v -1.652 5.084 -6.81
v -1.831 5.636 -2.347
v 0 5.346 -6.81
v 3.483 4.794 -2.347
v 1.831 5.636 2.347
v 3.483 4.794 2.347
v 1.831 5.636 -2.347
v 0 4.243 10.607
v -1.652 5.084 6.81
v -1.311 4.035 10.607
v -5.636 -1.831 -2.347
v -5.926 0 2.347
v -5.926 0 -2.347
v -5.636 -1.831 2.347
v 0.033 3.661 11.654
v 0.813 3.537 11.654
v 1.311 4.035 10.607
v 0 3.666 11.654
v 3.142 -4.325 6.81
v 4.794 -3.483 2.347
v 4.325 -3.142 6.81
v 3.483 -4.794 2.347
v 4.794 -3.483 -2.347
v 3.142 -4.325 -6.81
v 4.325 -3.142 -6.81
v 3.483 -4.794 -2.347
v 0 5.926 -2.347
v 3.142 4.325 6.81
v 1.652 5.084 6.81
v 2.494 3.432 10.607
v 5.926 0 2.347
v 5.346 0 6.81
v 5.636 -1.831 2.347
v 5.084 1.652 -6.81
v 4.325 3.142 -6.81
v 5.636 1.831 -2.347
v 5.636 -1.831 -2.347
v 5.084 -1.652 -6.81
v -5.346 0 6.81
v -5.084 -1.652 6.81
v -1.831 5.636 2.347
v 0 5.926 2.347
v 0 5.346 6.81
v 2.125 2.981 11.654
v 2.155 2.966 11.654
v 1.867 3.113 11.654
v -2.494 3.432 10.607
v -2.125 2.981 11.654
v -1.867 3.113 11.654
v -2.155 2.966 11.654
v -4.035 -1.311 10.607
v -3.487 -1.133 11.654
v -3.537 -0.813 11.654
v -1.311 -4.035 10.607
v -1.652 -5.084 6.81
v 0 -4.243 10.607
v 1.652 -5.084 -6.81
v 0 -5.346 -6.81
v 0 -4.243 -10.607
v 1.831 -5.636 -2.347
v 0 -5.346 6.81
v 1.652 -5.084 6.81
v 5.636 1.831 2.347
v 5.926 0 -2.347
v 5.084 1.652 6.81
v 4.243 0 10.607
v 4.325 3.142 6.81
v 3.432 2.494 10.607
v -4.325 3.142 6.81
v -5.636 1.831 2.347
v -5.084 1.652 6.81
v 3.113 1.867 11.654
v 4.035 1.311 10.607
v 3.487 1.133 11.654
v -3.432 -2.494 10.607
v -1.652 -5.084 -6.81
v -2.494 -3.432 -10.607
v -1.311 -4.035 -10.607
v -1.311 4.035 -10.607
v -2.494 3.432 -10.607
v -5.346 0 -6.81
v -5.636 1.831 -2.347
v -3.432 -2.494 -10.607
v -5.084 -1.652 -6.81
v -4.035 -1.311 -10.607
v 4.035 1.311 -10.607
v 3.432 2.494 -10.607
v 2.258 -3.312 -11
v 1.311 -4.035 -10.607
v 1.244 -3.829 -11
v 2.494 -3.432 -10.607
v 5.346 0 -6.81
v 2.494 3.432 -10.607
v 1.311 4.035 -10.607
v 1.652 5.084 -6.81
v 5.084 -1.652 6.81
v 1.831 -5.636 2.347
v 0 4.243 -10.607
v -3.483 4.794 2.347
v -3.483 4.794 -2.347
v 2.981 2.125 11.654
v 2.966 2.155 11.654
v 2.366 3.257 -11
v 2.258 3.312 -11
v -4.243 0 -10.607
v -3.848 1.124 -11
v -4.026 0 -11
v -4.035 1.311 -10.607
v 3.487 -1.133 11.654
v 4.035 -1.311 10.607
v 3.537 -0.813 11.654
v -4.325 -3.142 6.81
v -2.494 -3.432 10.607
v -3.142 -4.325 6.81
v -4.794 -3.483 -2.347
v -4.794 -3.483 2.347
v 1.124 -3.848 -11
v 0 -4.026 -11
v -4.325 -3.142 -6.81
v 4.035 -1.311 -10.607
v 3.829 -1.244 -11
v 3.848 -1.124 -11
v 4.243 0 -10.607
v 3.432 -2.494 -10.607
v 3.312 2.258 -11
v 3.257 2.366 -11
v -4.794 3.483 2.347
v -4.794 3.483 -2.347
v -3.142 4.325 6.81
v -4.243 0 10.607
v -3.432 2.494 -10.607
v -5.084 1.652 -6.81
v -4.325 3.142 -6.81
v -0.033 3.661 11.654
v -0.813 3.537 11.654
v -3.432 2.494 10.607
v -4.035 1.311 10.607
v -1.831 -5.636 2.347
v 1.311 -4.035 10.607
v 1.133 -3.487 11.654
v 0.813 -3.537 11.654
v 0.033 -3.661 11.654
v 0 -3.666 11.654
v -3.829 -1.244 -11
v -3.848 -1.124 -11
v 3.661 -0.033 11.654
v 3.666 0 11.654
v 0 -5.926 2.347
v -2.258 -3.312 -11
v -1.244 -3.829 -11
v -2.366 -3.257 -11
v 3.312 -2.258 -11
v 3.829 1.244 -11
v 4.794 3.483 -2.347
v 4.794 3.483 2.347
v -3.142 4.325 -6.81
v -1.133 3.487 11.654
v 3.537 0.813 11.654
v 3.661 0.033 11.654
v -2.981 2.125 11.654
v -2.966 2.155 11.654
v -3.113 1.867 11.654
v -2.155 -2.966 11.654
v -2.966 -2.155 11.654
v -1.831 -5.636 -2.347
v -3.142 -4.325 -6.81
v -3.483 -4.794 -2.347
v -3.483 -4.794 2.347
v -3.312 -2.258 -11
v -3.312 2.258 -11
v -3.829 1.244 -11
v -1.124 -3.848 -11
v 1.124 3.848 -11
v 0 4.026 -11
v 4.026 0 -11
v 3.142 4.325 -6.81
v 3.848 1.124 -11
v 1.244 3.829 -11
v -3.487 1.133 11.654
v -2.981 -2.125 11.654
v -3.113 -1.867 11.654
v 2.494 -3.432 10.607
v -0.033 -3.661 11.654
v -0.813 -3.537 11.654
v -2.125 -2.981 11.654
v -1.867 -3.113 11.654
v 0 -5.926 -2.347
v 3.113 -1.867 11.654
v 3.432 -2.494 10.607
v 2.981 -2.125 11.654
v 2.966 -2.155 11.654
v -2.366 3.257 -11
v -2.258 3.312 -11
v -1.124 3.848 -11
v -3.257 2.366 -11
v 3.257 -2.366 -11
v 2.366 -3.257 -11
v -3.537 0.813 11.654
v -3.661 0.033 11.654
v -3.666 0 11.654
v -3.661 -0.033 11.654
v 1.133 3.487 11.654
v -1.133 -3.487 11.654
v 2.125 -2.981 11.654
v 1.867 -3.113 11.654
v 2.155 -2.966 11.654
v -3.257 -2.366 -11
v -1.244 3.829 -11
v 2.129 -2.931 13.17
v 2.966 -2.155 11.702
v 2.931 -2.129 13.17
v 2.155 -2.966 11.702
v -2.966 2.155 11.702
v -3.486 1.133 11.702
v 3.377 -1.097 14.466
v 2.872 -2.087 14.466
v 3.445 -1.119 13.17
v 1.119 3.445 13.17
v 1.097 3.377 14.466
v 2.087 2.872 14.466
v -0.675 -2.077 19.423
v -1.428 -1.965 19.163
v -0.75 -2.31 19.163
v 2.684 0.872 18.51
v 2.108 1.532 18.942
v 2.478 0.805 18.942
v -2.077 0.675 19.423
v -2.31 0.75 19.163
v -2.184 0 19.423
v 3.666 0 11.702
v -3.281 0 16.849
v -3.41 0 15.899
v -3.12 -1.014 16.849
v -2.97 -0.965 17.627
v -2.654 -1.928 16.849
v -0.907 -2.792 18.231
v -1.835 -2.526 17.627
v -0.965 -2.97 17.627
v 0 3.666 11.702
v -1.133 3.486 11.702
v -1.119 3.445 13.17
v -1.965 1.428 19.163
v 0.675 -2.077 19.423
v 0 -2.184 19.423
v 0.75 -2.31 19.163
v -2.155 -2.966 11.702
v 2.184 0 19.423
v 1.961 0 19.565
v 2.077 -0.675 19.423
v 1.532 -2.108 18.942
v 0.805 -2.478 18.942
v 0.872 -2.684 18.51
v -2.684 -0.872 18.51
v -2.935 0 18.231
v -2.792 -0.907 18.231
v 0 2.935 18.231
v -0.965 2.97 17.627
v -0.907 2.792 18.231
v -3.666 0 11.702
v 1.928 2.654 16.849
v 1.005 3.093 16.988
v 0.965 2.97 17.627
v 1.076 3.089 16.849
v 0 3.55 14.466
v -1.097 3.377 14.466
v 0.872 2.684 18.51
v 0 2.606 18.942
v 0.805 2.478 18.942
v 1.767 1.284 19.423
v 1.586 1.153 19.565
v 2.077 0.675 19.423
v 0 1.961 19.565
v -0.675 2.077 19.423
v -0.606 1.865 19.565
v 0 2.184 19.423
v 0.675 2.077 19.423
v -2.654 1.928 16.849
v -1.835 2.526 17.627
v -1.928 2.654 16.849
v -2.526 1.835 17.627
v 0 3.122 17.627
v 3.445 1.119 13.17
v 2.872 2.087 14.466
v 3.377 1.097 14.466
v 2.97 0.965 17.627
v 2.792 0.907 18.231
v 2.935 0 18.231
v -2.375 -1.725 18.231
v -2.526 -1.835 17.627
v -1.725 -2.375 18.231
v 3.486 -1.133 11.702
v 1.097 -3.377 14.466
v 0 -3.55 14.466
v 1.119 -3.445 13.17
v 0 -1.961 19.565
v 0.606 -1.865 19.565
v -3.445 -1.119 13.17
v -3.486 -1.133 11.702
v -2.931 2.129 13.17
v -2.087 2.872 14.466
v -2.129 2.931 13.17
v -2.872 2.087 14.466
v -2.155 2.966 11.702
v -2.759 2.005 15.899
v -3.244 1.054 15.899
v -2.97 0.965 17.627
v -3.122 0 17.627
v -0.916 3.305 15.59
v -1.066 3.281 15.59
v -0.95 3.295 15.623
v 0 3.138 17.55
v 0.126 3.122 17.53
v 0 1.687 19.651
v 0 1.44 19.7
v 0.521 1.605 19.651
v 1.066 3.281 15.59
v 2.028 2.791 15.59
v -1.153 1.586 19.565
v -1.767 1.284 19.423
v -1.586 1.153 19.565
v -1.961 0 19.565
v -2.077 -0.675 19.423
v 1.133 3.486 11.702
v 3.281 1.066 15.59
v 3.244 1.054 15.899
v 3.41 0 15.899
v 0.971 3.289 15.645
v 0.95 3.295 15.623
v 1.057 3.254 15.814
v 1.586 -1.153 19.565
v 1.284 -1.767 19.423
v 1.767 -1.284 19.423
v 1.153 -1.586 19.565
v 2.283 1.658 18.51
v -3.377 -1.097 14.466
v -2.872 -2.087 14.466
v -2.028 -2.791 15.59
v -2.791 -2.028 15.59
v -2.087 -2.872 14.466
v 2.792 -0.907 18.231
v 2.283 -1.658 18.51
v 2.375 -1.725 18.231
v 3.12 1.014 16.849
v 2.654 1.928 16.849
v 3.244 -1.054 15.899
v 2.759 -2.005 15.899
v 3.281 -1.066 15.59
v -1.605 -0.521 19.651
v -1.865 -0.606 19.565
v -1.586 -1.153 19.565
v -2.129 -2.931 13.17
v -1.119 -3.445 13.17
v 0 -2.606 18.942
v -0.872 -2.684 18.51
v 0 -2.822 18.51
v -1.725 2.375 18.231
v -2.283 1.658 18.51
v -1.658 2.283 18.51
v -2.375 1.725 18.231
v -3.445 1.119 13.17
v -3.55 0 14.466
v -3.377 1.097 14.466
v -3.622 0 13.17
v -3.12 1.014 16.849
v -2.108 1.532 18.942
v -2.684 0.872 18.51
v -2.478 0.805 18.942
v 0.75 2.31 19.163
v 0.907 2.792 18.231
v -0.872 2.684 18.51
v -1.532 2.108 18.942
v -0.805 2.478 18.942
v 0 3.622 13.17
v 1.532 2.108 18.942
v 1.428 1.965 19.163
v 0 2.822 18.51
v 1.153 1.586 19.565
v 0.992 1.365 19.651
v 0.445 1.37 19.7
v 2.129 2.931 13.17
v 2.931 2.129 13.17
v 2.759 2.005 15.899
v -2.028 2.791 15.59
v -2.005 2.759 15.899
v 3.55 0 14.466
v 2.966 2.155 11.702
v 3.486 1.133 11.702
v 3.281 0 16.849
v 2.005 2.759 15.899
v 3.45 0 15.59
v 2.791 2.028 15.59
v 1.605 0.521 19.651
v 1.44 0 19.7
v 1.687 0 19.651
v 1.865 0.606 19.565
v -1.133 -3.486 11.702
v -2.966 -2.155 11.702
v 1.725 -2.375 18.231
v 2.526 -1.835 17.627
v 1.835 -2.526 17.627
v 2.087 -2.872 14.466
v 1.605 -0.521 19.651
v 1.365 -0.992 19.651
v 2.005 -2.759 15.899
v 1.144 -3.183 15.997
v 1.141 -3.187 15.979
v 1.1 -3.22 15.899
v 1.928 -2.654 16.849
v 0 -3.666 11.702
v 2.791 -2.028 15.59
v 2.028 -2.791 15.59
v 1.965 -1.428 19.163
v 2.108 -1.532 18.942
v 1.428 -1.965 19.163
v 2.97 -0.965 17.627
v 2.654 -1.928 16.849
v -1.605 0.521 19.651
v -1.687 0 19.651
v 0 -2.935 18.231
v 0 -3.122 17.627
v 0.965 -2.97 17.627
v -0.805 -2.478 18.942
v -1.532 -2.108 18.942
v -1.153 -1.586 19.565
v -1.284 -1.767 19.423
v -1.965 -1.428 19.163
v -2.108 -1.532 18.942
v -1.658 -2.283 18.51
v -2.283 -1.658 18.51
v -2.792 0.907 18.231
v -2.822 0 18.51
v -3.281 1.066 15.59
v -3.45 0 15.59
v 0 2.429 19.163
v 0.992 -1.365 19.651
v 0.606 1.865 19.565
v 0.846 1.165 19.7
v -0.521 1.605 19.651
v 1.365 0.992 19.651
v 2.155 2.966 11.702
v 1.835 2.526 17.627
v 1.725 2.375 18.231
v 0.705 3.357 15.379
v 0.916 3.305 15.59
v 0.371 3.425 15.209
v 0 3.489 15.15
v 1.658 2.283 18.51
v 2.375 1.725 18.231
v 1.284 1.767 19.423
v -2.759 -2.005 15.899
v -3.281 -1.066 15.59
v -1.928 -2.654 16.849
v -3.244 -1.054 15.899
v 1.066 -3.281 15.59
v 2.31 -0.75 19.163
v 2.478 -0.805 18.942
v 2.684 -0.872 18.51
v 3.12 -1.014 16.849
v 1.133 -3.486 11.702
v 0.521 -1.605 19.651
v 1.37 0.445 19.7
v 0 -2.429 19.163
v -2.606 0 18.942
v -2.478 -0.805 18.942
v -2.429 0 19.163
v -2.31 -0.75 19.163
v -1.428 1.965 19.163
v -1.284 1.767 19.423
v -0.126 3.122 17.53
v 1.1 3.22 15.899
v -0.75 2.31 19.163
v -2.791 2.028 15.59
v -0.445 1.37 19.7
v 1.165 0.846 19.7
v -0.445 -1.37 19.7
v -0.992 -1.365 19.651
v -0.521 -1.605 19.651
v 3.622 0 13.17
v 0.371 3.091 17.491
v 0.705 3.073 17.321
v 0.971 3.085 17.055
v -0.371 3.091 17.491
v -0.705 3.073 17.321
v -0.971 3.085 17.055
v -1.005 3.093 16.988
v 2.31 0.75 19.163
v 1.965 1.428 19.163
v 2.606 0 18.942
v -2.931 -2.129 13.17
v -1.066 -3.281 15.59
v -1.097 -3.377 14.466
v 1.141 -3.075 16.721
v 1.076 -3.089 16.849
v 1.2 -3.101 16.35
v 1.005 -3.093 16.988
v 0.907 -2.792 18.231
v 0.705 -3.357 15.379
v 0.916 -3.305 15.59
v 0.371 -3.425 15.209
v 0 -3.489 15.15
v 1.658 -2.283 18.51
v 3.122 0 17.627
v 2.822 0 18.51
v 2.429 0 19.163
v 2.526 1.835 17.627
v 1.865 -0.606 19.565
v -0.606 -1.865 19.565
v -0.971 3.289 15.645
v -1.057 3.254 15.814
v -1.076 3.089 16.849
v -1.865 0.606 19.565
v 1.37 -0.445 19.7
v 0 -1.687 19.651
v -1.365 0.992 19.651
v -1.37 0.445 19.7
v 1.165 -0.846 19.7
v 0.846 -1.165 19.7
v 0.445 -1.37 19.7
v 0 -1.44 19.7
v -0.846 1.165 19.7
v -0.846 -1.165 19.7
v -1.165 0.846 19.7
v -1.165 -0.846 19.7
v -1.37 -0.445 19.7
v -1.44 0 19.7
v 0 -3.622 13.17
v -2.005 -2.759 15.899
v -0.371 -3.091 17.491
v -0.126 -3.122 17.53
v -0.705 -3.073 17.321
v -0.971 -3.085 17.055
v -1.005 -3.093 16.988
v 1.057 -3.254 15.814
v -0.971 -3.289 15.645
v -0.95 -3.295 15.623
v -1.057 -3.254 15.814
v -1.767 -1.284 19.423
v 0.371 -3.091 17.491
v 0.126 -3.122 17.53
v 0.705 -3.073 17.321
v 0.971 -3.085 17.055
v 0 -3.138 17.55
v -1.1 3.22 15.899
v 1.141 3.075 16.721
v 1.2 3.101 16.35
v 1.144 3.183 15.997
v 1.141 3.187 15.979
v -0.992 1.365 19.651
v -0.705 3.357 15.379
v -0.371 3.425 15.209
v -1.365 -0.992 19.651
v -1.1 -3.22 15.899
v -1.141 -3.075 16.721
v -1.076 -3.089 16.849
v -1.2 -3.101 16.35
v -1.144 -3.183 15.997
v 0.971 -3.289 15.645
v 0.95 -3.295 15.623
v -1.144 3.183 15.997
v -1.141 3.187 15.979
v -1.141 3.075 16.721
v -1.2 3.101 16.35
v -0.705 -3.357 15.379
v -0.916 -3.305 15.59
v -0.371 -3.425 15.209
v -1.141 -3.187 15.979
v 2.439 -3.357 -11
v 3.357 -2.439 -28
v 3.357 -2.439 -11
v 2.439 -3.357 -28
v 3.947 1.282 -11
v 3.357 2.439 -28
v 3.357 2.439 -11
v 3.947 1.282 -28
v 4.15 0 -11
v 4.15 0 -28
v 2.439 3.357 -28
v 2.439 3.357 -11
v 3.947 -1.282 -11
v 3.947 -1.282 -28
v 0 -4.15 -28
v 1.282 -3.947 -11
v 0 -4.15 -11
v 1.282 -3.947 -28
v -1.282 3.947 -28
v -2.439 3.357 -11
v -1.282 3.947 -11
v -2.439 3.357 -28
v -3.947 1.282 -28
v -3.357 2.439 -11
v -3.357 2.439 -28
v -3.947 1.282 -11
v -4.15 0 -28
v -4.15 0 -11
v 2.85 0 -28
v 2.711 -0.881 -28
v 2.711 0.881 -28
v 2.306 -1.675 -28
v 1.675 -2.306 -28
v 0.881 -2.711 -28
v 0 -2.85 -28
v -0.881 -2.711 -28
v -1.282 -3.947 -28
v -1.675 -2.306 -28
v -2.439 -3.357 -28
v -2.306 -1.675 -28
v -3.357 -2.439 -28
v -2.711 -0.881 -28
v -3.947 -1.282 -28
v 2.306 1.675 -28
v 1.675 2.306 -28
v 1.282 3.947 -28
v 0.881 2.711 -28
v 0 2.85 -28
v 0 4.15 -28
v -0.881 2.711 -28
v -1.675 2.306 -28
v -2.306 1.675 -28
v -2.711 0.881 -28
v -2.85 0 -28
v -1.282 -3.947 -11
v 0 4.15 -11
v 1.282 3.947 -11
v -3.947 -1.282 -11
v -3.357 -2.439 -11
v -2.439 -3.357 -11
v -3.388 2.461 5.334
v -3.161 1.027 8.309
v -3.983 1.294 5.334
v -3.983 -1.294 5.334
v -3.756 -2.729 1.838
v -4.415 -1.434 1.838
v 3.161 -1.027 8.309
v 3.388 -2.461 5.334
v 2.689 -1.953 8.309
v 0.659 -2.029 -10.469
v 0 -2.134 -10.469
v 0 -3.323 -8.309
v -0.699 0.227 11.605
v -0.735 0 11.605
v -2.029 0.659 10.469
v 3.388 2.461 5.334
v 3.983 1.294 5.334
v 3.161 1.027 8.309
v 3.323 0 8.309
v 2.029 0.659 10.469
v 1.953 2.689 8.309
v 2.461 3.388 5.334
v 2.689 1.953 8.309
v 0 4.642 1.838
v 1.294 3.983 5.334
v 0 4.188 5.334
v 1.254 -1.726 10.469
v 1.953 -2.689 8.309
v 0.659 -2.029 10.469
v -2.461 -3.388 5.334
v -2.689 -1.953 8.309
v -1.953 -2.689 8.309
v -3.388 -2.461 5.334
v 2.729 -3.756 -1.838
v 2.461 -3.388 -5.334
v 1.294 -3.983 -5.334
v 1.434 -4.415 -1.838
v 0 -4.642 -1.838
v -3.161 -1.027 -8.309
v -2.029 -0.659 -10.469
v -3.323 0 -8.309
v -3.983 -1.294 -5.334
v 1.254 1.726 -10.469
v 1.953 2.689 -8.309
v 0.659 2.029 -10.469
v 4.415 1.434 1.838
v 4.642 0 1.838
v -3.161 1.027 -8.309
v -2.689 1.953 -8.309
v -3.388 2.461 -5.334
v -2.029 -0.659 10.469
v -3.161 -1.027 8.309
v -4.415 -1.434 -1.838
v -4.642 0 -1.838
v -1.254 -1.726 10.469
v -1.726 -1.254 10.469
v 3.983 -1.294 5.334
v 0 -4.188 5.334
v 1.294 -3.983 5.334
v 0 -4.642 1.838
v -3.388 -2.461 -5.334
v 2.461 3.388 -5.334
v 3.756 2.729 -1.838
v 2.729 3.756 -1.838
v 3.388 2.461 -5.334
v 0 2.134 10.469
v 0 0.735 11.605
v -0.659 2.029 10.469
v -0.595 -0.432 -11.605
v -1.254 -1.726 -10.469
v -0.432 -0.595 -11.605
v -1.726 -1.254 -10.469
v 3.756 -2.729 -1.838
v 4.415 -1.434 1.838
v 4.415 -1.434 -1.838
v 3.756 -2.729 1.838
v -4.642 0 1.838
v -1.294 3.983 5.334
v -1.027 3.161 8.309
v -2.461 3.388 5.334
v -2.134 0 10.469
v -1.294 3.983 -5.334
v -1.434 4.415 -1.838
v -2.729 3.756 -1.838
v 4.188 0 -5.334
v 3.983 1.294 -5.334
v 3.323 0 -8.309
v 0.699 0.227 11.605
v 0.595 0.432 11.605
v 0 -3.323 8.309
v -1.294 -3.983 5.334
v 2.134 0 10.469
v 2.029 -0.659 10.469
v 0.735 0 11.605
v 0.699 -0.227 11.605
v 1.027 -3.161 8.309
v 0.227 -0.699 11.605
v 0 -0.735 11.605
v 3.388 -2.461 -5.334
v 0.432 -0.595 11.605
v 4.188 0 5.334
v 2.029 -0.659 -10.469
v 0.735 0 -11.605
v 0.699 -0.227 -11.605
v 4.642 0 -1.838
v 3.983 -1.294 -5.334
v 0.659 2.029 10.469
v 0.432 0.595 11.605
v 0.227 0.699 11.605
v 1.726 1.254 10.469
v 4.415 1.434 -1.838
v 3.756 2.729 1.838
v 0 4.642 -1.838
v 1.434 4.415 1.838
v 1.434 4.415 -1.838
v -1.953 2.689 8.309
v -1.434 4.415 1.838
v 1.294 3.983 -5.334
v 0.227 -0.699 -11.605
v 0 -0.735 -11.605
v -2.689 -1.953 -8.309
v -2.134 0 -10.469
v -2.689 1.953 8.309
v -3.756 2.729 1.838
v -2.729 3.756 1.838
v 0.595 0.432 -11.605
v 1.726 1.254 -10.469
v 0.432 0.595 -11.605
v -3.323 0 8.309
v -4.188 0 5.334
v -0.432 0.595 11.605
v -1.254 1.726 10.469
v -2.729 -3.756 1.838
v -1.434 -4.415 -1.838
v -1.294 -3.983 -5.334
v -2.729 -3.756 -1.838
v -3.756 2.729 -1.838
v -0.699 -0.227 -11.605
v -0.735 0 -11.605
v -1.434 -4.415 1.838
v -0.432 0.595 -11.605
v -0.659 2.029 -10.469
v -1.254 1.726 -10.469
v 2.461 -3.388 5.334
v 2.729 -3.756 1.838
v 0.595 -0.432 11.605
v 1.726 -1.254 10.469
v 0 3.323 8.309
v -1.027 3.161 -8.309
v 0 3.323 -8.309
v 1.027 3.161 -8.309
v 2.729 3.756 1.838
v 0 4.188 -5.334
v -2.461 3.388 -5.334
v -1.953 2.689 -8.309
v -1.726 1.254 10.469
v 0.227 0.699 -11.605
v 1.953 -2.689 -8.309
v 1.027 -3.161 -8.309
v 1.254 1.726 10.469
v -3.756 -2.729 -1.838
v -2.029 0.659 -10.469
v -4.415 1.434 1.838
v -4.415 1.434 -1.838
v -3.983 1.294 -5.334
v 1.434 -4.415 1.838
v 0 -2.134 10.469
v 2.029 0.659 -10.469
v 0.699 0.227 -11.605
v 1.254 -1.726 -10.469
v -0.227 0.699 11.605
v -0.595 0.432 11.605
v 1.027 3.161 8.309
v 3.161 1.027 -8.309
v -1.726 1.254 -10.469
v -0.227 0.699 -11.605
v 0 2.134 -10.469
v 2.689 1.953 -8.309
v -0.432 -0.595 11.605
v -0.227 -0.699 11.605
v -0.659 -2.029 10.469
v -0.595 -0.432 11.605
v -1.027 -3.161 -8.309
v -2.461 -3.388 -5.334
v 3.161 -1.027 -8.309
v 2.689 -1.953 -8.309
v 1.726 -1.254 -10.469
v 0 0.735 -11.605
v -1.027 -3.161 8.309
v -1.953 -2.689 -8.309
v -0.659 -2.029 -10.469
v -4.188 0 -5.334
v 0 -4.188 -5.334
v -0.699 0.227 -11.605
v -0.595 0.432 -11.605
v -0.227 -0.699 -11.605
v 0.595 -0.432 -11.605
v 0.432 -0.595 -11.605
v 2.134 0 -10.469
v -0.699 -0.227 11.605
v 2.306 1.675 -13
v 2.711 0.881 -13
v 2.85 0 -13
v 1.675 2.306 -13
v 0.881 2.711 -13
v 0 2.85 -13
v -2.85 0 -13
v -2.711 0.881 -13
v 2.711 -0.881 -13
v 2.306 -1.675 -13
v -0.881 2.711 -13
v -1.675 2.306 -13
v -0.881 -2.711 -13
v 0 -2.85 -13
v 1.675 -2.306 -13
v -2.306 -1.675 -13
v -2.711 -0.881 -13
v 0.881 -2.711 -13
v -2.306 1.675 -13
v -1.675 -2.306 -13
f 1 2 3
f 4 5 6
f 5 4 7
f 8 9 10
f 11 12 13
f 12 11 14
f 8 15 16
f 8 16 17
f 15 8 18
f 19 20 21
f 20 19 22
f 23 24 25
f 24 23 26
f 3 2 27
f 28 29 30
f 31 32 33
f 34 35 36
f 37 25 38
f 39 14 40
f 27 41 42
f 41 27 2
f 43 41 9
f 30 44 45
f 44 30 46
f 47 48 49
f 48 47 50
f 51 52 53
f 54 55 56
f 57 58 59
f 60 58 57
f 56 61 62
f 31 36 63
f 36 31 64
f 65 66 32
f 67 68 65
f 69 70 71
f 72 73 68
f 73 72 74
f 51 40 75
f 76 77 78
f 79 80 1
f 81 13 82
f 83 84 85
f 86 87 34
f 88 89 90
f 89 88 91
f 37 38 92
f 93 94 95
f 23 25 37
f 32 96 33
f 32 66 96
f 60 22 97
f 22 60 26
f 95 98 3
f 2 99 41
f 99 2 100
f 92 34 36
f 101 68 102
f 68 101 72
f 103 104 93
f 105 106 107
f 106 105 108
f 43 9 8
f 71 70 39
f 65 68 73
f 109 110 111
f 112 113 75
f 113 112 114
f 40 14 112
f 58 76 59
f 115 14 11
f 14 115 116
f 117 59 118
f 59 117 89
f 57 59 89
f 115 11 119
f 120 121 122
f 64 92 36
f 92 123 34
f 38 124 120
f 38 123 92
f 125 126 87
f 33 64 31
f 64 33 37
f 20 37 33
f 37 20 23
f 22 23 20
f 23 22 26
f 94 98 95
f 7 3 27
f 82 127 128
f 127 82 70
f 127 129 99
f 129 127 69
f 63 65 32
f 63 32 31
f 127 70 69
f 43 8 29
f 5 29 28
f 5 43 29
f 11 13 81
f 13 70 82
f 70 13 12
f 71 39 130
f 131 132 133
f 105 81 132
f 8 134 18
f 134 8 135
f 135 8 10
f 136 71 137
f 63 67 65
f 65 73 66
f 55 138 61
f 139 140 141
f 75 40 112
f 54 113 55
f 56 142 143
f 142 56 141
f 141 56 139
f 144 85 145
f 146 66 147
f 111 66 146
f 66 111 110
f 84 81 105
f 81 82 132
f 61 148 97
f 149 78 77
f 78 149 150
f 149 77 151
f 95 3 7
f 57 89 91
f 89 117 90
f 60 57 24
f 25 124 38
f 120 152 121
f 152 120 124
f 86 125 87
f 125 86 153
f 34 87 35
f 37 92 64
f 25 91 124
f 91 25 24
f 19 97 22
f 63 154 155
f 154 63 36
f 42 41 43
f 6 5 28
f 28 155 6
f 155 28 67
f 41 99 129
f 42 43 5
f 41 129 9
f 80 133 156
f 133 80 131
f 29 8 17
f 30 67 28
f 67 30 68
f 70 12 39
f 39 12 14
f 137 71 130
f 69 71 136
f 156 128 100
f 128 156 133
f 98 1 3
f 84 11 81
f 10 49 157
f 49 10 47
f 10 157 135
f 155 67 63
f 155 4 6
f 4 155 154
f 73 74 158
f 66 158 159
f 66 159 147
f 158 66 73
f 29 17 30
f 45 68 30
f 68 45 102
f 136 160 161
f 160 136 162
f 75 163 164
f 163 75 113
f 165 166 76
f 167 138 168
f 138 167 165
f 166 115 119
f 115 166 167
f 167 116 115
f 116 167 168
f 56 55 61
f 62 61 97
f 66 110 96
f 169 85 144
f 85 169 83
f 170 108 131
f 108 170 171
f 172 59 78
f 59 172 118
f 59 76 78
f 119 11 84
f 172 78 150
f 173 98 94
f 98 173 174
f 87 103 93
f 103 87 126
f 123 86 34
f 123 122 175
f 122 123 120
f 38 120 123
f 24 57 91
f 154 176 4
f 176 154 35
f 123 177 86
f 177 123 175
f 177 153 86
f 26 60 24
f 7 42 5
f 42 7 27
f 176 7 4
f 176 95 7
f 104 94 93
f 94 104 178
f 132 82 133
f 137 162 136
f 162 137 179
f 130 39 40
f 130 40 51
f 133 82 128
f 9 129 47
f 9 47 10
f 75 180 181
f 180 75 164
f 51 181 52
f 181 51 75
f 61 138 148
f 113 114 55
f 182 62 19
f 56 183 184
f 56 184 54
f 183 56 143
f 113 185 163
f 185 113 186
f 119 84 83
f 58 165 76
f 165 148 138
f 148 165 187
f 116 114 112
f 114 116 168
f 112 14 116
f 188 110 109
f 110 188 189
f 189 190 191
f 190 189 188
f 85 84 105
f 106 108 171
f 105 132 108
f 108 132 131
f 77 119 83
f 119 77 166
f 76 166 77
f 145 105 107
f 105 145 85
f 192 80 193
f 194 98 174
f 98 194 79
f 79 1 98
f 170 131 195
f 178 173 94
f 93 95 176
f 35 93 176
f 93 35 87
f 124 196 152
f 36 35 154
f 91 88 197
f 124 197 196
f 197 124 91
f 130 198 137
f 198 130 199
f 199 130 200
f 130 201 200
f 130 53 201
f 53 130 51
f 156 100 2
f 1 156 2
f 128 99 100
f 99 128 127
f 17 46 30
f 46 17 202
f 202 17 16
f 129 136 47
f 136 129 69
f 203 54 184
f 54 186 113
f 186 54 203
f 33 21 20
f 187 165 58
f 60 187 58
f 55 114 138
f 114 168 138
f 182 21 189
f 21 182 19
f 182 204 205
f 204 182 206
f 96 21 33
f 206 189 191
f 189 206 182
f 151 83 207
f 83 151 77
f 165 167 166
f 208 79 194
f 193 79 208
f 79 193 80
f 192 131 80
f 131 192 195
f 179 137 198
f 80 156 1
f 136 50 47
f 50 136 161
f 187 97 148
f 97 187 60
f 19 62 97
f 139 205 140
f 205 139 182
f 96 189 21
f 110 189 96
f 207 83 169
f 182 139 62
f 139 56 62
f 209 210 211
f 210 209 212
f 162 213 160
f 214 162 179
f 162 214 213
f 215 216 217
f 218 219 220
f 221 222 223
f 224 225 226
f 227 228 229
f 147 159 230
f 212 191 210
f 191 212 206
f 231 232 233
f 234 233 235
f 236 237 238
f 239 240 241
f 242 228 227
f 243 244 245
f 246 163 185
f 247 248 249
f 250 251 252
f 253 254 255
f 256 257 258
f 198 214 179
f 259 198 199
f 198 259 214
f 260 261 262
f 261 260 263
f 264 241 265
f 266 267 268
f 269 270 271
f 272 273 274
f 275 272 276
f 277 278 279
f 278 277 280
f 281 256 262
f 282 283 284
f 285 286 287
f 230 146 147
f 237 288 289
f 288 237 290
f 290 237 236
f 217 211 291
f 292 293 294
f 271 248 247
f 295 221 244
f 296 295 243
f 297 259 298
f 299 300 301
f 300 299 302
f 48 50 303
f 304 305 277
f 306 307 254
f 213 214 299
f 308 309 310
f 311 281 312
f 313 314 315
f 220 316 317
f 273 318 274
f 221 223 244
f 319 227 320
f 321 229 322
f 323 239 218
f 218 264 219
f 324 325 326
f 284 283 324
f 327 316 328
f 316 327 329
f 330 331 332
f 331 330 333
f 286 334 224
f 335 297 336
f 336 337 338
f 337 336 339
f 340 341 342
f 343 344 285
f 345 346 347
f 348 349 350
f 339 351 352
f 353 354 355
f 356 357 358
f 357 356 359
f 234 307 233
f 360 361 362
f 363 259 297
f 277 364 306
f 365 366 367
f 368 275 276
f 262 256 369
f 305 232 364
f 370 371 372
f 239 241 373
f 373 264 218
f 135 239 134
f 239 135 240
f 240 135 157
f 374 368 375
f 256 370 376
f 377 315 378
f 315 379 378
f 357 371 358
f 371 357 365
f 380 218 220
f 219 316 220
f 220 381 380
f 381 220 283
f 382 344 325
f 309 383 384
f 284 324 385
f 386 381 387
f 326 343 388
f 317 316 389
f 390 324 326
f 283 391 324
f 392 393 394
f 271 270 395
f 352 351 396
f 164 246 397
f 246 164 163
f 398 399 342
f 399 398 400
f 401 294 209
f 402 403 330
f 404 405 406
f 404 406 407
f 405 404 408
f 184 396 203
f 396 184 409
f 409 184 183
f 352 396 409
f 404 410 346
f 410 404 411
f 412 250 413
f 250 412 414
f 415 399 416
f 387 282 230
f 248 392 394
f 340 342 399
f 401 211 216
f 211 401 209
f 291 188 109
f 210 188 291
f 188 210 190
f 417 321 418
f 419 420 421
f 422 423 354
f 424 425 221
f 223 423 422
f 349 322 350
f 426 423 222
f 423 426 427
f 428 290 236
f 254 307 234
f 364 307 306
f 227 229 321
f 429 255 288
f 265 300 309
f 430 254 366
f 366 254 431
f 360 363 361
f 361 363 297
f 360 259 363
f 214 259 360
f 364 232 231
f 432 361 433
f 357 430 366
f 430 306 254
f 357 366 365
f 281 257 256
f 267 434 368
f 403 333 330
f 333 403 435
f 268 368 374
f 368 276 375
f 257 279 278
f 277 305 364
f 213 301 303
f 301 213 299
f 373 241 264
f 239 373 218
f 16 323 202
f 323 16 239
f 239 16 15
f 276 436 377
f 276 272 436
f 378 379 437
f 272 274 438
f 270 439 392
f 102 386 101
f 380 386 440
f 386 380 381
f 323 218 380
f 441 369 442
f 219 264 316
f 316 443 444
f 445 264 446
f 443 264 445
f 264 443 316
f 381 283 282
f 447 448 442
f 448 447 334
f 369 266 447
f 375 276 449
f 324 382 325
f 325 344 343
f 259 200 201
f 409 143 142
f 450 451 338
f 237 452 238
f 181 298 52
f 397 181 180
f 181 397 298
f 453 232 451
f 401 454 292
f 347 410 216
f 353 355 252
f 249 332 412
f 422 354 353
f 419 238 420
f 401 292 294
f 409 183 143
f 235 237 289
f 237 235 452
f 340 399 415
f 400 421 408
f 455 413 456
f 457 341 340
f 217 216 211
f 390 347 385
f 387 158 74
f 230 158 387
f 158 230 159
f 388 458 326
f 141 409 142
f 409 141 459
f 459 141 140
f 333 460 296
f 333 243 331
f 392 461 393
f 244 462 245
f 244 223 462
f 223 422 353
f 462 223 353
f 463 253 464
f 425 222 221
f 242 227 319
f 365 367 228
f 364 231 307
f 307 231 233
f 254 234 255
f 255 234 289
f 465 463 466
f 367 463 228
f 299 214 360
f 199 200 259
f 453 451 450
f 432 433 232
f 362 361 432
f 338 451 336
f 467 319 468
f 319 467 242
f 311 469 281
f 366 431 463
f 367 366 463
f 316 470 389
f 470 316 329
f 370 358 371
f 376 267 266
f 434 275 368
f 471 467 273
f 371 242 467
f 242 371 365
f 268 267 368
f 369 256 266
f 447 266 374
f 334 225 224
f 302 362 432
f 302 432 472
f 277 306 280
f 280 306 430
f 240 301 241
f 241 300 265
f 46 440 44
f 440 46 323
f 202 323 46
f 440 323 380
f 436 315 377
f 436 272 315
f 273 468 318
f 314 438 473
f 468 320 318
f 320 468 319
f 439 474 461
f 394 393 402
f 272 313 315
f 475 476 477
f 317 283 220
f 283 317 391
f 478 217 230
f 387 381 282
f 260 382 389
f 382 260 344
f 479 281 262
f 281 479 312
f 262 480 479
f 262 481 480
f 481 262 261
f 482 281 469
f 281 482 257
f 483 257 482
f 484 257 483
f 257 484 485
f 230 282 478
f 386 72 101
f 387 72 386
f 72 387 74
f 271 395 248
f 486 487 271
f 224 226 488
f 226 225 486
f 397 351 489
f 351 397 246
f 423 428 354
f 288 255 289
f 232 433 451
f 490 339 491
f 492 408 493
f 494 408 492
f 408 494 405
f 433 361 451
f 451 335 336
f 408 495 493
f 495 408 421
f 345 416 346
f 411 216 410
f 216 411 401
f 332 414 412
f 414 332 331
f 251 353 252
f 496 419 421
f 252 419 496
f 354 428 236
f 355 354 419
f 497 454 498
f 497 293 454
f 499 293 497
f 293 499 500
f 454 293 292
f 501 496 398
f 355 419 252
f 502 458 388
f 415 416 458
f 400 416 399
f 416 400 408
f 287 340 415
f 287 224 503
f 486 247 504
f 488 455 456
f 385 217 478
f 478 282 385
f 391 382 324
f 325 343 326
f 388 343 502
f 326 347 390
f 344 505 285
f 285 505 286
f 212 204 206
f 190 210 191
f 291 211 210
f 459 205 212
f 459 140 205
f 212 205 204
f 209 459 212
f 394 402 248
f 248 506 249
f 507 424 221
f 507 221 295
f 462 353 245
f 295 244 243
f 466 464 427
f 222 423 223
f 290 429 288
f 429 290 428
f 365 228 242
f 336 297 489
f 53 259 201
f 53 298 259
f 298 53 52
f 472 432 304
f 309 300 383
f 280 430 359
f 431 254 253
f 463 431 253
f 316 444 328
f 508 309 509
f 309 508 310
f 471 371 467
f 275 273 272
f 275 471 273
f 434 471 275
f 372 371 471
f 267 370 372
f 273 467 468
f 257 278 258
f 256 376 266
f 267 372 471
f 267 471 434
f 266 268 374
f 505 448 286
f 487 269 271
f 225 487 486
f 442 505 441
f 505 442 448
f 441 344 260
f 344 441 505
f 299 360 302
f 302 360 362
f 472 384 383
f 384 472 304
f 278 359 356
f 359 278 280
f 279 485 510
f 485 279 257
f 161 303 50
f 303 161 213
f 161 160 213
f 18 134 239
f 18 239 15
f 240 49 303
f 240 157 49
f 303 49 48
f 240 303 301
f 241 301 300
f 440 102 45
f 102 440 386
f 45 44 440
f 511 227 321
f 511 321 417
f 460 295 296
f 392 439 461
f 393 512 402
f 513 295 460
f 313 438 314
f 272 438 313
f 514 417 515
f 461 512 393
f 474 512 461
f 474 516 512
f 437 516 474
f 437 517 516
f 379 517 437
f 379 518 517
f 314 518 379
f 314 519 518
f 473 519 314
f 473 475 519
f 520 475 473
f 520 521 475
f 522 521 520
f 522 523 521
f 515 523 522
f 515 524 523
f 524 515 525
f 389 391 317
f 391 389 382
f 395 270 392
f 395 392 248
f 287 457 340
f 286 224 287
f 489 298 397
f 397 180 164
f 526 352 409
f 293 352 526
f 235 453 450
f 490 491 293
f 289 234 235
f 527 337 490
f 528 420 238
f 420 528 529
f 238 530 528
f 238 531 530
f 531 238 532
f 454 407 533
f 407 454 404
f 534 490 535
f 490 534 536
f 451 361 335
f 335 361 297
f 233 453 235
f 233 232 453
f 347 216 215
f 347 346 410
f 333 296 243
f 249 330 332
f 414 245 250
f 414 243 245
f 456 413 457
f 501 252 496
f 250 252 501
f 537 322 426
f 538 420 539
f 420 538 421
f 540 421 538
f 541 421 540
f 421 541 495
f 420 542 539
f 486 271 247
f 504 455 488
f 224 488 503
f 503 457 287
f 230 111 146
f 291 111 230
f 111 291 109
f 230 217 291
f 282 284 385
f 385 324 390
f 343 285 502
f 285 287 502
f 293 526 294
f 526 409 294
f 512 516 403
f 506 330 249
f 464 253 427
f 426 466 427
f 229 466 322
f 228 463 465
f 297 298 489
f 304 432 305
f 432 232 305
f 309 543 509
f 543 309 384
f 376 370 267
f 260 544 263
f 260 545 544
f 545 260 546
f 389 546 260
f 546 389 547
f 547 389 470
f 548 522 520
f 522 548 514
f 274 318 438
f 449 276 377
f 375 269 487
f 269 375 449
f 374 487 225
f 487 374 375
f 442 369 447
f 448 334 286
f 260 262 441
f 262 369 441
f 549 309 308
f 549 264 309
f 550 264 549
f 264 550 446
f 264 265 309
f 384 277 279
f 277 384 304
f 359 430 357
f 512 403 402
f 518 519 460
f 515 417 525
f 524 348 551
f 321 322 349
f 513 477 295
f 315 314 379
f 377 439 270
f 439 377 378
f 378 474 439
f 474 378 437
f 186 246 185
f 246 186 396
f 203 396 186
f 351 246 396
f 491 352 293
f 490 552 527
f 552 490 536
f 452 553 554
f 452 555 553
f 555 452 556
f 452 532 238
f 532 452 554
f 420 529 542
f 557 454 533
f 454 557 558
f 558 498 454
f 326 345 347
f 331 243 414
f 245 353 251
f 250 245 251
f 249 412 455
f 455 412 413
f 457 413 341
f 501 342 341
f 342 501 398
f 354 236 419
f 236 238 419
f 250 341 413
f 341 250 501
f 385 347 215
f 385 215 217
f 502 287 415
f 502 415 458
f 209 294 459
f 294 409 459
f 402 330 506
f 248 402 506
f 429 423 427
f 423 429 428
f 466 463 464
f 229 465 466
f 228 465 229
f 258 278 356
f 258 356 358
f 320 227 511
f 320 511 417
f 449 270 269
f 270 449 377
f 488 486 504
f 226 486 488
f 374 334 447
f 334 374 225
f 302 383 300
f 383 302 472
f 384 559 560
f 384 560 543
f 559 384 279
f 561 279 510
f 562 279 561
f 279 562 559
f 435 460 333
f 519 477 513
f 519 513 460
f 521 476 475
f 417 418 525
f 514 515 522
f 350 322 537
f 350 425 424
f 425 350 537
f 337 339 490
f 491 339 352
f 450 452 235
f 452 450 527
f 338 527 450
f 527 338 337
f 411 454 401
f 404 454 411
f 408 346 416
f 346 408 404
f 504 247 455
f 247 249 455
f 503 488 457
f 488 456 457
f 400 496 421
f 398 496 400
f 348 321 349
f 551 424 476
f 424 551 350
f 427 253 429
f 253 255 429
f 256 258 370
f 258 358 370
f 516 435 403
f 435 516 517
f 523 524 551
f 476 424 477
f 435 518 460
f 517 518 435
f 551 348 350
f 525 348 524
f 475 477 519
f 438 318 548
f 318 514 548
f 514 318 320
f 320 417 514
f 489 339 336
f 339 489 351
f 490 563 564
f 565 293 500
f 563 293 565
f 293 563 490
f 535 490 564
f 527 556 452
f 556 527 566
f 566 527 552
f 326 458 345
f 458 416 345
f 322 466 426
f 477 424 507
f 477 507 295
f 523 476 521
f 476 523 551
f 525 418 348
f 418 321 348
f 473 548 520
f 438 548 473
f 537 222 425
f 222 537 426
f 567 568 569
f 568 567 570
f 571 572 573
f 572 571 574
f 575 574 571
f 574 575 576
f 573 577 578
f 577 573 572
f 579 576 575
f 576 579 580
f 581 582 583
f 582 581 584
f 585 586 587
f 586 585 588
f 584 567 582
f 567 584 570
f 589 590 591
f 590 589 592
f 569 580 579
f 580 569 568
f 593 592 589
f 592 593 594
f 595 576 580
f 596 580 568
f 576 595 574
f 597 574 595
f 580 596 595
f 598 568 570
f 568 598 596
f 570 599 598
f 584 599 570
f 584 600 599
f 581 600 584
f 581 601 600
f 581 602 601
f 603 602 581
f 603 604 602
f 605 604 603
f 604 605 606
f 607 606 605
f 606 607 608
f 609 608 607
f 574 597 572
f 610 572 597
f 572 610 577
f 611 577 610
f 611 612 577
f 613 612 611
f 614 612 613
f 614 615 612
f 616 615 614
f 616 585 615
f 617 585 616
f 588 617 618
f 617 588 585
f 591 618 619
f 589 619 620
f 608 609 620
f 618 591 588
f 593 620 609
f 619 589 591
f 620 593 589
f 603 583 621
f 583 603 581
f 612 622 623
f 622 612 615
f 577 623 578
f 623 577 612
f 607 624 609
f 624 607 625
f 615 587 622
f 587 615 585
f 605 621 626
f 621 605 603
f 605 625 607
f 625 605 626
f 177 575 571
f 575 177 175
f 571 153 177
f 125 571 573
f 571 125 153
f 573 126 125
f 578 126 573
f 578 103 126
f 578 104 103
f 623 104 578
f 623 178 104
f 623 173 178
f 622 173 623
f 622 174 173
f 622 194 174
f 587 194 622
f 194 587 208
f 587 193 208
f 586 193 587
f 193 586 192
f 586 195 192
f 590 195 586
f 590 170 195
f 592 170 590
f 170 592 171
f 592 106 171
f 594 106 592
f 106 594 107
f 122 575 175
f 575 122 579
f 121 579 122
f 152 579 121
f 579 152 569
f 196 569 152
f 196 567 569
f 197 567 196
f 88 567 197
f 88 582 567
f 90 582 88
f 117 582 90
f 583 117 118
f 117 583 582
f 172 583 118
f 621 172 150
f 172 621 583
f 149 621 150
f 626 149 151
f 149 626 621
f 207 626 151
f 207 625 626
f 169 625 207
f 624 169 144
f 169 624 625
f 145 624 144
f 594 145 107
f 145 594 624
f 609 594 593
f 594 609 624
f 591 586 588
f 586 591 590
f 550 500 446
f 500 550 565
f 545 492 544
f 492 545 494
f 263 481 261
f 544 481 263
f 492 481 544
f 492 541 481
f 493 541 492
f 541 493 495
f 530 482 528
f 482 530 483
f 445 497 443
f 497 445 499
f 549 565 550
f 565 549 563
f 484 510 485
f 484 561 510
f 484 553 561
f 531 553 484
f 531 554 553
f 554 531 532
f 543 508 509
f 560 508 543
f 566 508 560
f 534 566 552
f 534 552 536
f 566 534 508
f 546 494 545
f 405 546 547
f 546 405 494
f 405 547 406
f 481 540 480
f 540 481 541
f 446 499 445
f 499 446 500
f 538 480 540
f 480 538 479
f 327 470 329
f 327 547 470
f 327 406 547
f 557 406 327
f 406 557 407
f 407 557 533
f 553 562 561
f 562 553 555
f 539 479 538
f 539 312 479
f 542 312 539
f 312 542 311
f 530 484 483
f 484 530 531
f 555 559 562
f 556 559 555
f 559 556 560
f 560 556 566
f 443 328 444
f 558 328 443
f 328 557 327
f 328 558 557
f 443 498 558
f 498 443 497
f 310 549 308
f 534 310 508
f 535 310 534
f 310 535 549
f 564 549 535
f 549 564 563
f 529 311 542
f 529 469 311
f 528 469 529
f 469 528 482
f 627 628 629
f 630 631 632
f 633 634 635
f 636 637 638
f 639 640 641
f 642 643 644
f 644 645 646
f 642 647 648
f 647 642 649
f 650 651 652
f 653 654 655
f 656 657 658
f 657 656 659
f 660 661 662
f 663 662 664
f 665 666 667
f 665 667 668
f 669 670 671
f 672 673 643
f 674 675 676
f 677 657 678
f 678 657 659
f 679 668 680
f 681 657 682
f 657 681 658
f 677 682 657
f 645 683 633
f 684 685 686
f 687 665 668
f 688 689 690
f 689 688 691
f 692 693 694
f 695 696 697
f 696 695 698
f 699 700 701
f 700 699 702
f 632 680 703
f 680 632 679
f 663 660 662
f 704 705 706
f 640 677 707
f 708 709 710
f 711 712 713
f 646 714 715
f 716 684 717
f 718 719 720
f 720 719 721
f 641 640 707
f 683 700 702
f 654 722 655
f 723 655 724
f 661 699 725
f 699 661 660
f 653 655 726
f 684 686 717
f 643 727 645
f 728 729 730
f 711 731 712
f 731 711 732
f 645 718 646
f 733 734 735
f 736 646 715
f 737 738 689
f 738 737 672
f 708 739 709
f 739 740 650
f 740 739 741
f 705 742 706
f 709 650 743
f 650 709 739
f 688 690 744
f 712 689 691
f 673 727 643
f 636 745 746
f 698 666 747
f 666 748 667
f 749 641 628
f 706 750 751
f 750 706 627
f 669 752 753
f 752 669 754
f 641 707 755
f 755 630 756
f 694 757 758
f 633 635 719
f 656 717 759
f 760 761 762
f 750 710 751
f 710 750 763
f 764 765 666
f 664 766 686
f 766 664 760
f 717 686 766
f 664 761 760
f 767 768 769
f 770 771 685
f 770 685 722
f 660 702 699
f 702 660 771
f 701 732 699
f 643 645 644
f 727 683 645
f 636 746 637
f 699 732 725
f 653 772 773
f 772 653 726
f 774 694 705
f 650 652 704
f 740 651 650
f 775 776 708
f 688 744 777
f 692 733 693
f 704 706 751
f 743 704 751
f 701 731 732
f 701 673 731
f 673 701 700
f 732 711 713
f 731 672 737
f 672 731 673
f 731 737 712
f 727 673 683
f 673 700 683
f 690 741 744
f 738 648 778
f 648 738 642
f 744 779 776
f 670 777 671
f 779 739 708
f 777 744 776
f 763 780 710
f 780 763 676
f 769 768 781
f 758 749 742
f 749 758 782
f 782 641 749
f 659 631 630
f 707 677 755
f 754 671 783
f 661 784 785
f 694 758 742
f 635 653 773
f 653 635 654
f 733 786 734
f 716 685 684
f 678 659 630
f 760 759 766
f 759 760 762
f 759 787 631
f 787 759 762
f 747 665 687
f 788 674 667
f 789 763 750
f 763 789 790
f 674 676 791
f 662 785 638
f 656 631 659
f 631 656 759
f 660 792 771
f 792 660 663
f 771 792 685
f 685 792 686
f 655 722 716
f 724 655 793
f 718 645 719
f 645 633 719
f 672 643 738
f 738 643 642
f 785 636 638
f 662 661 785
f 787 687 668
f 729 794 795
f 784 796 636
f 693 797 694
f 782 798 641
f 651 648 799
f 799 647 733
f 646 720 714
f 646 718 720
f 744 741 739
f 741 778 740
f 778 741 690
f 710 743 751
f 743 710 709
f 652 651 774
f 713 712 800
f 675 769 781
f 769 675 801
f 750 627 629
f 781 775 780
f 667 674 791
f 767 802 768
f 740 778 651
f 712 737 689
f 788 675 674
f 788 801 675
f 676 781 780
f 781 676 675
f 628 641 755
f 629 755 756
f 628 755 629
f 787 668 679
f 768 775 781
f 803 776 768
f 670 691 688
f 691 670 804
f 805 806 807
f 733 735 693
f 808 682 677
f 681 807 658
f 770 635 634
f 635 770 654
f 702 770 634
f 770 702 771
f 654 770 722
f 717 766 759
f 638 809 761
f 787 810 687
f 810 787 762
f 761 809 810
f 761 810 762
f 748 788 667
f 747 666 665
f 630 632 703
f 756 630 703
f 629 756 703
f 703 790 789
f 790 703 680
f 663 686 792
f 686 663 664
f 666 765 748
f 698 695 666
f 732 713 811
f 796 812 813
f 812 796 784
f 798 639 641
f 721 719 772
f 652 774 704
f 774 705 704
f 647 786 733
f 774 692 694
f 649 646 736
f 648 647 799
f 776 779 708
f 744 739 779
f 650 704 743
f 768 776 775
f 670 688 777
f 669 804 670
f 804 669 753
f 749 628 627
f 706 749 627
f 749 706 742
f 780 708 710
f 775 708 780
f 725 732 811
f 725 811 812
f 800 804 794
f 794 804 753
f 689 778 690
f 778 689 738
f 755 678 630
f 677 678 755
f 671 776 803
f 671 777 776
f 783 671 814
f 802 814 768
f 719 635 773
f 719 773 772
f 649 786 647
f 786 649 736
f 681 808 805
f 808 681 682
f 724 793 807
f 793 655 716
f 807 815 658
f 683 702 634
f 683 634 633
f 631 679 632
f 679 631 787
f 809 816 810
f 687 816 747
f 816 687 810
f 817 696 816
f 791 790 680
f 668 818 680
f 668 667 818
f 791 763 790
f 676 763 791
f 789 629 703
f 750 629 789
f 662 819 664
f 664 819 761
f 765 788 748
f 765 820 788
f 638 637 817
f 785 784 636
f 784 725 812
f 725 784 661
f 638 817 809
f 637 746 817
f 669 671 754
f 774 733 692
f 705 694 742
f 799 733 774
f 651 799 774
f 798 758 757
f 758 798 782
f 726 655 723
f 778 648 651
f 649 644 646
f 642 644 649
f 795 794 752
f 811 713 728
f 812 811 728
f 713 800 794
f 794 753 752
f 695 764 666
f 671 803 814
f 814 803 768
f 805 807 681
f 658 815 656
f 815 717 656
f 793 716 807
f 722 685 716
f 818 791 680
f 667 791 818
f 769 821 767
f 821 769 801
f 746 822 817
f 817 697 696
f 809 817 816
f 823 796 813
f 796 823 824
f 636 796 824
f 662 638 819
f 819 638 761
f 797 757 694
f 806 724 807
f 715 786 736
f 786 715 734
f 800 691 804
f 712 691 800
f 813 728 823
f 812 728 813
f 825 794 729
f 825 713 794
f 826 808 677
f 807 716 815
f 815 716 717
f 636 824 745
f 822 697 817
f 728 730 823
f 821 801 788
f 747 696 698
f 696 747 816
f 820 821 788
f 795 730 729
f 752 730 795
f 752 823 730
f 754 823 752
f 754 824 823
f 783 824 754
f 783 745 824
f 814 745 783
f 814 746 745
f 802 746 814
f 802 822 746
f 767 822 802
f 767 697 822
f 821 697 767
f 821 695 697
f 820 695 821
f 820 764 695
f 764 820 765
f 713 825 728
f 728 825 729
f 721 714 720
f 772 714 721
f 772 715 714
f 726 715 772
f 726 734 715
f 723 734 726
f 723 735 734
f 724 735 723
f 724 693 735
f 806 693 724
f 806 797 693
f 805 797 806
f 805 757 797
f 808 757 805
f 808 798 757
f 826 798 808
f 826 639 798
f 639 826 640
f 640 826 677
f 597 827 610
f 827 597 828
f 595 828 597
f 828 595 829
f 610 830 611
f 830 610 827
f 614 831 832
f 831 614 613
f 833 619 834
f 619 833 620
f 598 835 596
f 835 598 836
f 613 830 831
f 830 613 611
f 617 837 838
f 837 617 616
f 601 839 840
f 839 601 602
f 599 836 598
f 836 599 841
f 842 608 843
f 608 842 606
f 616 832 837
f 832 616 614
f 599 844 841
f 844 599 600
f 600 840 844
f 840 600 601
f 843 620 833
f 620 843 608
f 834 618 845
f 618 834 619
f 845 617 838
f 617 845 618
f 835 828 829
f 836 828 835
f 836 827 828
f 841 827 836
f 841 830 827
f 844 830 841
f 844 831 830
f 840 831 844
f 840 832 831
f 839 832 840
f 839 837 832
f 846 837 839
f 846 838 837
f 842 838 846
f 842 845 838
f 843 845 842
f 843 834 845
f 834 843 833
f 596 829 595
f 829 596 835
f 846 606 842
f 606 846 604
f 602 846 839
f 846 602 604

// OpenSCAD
// file: bezier.scad
module line(p1,p2,w) {
    hull() {
        translate(p1) circle(r=w);
        translate(p2) circle(r=w);
    }
}
module polyline(points, index, w) {
    if(index < len(points)) {
        line(points[index - 1], points[index],w);
        polyline(points, index + 1, w);
    }
}

function choose(n, k)=
     k == 0? 1
    : (n * choose(n - 1, k - 1)) / k;

function _point_on_bezier_rec(points,t,i,c)=
    len(points) == i ? c
    : _point_on_bezier_rec(points,t,i+1,c+choose(len(points)-1,i) * pow(t,i) * pow(1-t,len(points)-i-1) * points[i]);

function _point_on_bezier(points,t)=
    _point_on_bezier_rec(points,t,0,[0,0]);

//a bezier curve with any number of control points
//parameters: 
//points - the control points of the bezier curve (number of points is variable)
//resolution - the sampling resolution of the bezier curve (number of returned points)
//returns:
//resolution number of samples on the bezier curve
function bezier(points,fn)=[
    for (t =[0:1.0/fn:1+(1/fn/2)]) _point_on_bezier(points, t)
    ];

//create a 3D rotational model with a bezier curve of given points, resolution and thickness
module bezier_model(points,resolution,thickness) {
    translate([0,0,thickness/2]) rotate_extrude() polyline(bezier(points,resolution),1,thickness/2);
}
    
// main file
r = 6;
scale_z = 2.5;
s = 1.3;
$fn = 20;

top_radius = 3.6;
top_height = 2.7;
top_scale = 0.8;

top_hole_radius = 1.2;

holder_height = 17;
light_radius = 2.85;
holder_radius = light_radius+s;
light_deepness = 15;

top_margin = r*0.99;
bottom_margin = r/1.5;
use <bezier.scad>


difference() {
    union() {
        scale([1.0,1.0,scale_z])sphere(r);
        
        scale([top_scale,top_scale,1])hull()bezier_model([[top_radius,r*scale_z-top_margin],[top_radius,r*scale_z+top_height],[top_radius/2,r*scale_z+top_height]],10,2);
 
        translate([0,0,-r*scale_z-holder_height+bottom_margin])cylinder(holder_height,holder_radius,holder_radius);
    }
    translate([0,0,r*scale_z+top_height/2]) rotate([90,0,0]) cylinder(1000,top_hole_radius,top_hole_radius,center=true);
   scale([1.0,1.0,scale_z]) sphere(r-s);
    translate([0,0,-r*scale_z-holder_height+bottom_margin]) cylinder(light_deepness,light_radius,light_radius);
}



//calculate needed weight
v = 3.1415*(4/3)*pow((r-s)/10,3)*scale_z;
echo("NECCECARY WEIGHT",v);
//f = m*a
